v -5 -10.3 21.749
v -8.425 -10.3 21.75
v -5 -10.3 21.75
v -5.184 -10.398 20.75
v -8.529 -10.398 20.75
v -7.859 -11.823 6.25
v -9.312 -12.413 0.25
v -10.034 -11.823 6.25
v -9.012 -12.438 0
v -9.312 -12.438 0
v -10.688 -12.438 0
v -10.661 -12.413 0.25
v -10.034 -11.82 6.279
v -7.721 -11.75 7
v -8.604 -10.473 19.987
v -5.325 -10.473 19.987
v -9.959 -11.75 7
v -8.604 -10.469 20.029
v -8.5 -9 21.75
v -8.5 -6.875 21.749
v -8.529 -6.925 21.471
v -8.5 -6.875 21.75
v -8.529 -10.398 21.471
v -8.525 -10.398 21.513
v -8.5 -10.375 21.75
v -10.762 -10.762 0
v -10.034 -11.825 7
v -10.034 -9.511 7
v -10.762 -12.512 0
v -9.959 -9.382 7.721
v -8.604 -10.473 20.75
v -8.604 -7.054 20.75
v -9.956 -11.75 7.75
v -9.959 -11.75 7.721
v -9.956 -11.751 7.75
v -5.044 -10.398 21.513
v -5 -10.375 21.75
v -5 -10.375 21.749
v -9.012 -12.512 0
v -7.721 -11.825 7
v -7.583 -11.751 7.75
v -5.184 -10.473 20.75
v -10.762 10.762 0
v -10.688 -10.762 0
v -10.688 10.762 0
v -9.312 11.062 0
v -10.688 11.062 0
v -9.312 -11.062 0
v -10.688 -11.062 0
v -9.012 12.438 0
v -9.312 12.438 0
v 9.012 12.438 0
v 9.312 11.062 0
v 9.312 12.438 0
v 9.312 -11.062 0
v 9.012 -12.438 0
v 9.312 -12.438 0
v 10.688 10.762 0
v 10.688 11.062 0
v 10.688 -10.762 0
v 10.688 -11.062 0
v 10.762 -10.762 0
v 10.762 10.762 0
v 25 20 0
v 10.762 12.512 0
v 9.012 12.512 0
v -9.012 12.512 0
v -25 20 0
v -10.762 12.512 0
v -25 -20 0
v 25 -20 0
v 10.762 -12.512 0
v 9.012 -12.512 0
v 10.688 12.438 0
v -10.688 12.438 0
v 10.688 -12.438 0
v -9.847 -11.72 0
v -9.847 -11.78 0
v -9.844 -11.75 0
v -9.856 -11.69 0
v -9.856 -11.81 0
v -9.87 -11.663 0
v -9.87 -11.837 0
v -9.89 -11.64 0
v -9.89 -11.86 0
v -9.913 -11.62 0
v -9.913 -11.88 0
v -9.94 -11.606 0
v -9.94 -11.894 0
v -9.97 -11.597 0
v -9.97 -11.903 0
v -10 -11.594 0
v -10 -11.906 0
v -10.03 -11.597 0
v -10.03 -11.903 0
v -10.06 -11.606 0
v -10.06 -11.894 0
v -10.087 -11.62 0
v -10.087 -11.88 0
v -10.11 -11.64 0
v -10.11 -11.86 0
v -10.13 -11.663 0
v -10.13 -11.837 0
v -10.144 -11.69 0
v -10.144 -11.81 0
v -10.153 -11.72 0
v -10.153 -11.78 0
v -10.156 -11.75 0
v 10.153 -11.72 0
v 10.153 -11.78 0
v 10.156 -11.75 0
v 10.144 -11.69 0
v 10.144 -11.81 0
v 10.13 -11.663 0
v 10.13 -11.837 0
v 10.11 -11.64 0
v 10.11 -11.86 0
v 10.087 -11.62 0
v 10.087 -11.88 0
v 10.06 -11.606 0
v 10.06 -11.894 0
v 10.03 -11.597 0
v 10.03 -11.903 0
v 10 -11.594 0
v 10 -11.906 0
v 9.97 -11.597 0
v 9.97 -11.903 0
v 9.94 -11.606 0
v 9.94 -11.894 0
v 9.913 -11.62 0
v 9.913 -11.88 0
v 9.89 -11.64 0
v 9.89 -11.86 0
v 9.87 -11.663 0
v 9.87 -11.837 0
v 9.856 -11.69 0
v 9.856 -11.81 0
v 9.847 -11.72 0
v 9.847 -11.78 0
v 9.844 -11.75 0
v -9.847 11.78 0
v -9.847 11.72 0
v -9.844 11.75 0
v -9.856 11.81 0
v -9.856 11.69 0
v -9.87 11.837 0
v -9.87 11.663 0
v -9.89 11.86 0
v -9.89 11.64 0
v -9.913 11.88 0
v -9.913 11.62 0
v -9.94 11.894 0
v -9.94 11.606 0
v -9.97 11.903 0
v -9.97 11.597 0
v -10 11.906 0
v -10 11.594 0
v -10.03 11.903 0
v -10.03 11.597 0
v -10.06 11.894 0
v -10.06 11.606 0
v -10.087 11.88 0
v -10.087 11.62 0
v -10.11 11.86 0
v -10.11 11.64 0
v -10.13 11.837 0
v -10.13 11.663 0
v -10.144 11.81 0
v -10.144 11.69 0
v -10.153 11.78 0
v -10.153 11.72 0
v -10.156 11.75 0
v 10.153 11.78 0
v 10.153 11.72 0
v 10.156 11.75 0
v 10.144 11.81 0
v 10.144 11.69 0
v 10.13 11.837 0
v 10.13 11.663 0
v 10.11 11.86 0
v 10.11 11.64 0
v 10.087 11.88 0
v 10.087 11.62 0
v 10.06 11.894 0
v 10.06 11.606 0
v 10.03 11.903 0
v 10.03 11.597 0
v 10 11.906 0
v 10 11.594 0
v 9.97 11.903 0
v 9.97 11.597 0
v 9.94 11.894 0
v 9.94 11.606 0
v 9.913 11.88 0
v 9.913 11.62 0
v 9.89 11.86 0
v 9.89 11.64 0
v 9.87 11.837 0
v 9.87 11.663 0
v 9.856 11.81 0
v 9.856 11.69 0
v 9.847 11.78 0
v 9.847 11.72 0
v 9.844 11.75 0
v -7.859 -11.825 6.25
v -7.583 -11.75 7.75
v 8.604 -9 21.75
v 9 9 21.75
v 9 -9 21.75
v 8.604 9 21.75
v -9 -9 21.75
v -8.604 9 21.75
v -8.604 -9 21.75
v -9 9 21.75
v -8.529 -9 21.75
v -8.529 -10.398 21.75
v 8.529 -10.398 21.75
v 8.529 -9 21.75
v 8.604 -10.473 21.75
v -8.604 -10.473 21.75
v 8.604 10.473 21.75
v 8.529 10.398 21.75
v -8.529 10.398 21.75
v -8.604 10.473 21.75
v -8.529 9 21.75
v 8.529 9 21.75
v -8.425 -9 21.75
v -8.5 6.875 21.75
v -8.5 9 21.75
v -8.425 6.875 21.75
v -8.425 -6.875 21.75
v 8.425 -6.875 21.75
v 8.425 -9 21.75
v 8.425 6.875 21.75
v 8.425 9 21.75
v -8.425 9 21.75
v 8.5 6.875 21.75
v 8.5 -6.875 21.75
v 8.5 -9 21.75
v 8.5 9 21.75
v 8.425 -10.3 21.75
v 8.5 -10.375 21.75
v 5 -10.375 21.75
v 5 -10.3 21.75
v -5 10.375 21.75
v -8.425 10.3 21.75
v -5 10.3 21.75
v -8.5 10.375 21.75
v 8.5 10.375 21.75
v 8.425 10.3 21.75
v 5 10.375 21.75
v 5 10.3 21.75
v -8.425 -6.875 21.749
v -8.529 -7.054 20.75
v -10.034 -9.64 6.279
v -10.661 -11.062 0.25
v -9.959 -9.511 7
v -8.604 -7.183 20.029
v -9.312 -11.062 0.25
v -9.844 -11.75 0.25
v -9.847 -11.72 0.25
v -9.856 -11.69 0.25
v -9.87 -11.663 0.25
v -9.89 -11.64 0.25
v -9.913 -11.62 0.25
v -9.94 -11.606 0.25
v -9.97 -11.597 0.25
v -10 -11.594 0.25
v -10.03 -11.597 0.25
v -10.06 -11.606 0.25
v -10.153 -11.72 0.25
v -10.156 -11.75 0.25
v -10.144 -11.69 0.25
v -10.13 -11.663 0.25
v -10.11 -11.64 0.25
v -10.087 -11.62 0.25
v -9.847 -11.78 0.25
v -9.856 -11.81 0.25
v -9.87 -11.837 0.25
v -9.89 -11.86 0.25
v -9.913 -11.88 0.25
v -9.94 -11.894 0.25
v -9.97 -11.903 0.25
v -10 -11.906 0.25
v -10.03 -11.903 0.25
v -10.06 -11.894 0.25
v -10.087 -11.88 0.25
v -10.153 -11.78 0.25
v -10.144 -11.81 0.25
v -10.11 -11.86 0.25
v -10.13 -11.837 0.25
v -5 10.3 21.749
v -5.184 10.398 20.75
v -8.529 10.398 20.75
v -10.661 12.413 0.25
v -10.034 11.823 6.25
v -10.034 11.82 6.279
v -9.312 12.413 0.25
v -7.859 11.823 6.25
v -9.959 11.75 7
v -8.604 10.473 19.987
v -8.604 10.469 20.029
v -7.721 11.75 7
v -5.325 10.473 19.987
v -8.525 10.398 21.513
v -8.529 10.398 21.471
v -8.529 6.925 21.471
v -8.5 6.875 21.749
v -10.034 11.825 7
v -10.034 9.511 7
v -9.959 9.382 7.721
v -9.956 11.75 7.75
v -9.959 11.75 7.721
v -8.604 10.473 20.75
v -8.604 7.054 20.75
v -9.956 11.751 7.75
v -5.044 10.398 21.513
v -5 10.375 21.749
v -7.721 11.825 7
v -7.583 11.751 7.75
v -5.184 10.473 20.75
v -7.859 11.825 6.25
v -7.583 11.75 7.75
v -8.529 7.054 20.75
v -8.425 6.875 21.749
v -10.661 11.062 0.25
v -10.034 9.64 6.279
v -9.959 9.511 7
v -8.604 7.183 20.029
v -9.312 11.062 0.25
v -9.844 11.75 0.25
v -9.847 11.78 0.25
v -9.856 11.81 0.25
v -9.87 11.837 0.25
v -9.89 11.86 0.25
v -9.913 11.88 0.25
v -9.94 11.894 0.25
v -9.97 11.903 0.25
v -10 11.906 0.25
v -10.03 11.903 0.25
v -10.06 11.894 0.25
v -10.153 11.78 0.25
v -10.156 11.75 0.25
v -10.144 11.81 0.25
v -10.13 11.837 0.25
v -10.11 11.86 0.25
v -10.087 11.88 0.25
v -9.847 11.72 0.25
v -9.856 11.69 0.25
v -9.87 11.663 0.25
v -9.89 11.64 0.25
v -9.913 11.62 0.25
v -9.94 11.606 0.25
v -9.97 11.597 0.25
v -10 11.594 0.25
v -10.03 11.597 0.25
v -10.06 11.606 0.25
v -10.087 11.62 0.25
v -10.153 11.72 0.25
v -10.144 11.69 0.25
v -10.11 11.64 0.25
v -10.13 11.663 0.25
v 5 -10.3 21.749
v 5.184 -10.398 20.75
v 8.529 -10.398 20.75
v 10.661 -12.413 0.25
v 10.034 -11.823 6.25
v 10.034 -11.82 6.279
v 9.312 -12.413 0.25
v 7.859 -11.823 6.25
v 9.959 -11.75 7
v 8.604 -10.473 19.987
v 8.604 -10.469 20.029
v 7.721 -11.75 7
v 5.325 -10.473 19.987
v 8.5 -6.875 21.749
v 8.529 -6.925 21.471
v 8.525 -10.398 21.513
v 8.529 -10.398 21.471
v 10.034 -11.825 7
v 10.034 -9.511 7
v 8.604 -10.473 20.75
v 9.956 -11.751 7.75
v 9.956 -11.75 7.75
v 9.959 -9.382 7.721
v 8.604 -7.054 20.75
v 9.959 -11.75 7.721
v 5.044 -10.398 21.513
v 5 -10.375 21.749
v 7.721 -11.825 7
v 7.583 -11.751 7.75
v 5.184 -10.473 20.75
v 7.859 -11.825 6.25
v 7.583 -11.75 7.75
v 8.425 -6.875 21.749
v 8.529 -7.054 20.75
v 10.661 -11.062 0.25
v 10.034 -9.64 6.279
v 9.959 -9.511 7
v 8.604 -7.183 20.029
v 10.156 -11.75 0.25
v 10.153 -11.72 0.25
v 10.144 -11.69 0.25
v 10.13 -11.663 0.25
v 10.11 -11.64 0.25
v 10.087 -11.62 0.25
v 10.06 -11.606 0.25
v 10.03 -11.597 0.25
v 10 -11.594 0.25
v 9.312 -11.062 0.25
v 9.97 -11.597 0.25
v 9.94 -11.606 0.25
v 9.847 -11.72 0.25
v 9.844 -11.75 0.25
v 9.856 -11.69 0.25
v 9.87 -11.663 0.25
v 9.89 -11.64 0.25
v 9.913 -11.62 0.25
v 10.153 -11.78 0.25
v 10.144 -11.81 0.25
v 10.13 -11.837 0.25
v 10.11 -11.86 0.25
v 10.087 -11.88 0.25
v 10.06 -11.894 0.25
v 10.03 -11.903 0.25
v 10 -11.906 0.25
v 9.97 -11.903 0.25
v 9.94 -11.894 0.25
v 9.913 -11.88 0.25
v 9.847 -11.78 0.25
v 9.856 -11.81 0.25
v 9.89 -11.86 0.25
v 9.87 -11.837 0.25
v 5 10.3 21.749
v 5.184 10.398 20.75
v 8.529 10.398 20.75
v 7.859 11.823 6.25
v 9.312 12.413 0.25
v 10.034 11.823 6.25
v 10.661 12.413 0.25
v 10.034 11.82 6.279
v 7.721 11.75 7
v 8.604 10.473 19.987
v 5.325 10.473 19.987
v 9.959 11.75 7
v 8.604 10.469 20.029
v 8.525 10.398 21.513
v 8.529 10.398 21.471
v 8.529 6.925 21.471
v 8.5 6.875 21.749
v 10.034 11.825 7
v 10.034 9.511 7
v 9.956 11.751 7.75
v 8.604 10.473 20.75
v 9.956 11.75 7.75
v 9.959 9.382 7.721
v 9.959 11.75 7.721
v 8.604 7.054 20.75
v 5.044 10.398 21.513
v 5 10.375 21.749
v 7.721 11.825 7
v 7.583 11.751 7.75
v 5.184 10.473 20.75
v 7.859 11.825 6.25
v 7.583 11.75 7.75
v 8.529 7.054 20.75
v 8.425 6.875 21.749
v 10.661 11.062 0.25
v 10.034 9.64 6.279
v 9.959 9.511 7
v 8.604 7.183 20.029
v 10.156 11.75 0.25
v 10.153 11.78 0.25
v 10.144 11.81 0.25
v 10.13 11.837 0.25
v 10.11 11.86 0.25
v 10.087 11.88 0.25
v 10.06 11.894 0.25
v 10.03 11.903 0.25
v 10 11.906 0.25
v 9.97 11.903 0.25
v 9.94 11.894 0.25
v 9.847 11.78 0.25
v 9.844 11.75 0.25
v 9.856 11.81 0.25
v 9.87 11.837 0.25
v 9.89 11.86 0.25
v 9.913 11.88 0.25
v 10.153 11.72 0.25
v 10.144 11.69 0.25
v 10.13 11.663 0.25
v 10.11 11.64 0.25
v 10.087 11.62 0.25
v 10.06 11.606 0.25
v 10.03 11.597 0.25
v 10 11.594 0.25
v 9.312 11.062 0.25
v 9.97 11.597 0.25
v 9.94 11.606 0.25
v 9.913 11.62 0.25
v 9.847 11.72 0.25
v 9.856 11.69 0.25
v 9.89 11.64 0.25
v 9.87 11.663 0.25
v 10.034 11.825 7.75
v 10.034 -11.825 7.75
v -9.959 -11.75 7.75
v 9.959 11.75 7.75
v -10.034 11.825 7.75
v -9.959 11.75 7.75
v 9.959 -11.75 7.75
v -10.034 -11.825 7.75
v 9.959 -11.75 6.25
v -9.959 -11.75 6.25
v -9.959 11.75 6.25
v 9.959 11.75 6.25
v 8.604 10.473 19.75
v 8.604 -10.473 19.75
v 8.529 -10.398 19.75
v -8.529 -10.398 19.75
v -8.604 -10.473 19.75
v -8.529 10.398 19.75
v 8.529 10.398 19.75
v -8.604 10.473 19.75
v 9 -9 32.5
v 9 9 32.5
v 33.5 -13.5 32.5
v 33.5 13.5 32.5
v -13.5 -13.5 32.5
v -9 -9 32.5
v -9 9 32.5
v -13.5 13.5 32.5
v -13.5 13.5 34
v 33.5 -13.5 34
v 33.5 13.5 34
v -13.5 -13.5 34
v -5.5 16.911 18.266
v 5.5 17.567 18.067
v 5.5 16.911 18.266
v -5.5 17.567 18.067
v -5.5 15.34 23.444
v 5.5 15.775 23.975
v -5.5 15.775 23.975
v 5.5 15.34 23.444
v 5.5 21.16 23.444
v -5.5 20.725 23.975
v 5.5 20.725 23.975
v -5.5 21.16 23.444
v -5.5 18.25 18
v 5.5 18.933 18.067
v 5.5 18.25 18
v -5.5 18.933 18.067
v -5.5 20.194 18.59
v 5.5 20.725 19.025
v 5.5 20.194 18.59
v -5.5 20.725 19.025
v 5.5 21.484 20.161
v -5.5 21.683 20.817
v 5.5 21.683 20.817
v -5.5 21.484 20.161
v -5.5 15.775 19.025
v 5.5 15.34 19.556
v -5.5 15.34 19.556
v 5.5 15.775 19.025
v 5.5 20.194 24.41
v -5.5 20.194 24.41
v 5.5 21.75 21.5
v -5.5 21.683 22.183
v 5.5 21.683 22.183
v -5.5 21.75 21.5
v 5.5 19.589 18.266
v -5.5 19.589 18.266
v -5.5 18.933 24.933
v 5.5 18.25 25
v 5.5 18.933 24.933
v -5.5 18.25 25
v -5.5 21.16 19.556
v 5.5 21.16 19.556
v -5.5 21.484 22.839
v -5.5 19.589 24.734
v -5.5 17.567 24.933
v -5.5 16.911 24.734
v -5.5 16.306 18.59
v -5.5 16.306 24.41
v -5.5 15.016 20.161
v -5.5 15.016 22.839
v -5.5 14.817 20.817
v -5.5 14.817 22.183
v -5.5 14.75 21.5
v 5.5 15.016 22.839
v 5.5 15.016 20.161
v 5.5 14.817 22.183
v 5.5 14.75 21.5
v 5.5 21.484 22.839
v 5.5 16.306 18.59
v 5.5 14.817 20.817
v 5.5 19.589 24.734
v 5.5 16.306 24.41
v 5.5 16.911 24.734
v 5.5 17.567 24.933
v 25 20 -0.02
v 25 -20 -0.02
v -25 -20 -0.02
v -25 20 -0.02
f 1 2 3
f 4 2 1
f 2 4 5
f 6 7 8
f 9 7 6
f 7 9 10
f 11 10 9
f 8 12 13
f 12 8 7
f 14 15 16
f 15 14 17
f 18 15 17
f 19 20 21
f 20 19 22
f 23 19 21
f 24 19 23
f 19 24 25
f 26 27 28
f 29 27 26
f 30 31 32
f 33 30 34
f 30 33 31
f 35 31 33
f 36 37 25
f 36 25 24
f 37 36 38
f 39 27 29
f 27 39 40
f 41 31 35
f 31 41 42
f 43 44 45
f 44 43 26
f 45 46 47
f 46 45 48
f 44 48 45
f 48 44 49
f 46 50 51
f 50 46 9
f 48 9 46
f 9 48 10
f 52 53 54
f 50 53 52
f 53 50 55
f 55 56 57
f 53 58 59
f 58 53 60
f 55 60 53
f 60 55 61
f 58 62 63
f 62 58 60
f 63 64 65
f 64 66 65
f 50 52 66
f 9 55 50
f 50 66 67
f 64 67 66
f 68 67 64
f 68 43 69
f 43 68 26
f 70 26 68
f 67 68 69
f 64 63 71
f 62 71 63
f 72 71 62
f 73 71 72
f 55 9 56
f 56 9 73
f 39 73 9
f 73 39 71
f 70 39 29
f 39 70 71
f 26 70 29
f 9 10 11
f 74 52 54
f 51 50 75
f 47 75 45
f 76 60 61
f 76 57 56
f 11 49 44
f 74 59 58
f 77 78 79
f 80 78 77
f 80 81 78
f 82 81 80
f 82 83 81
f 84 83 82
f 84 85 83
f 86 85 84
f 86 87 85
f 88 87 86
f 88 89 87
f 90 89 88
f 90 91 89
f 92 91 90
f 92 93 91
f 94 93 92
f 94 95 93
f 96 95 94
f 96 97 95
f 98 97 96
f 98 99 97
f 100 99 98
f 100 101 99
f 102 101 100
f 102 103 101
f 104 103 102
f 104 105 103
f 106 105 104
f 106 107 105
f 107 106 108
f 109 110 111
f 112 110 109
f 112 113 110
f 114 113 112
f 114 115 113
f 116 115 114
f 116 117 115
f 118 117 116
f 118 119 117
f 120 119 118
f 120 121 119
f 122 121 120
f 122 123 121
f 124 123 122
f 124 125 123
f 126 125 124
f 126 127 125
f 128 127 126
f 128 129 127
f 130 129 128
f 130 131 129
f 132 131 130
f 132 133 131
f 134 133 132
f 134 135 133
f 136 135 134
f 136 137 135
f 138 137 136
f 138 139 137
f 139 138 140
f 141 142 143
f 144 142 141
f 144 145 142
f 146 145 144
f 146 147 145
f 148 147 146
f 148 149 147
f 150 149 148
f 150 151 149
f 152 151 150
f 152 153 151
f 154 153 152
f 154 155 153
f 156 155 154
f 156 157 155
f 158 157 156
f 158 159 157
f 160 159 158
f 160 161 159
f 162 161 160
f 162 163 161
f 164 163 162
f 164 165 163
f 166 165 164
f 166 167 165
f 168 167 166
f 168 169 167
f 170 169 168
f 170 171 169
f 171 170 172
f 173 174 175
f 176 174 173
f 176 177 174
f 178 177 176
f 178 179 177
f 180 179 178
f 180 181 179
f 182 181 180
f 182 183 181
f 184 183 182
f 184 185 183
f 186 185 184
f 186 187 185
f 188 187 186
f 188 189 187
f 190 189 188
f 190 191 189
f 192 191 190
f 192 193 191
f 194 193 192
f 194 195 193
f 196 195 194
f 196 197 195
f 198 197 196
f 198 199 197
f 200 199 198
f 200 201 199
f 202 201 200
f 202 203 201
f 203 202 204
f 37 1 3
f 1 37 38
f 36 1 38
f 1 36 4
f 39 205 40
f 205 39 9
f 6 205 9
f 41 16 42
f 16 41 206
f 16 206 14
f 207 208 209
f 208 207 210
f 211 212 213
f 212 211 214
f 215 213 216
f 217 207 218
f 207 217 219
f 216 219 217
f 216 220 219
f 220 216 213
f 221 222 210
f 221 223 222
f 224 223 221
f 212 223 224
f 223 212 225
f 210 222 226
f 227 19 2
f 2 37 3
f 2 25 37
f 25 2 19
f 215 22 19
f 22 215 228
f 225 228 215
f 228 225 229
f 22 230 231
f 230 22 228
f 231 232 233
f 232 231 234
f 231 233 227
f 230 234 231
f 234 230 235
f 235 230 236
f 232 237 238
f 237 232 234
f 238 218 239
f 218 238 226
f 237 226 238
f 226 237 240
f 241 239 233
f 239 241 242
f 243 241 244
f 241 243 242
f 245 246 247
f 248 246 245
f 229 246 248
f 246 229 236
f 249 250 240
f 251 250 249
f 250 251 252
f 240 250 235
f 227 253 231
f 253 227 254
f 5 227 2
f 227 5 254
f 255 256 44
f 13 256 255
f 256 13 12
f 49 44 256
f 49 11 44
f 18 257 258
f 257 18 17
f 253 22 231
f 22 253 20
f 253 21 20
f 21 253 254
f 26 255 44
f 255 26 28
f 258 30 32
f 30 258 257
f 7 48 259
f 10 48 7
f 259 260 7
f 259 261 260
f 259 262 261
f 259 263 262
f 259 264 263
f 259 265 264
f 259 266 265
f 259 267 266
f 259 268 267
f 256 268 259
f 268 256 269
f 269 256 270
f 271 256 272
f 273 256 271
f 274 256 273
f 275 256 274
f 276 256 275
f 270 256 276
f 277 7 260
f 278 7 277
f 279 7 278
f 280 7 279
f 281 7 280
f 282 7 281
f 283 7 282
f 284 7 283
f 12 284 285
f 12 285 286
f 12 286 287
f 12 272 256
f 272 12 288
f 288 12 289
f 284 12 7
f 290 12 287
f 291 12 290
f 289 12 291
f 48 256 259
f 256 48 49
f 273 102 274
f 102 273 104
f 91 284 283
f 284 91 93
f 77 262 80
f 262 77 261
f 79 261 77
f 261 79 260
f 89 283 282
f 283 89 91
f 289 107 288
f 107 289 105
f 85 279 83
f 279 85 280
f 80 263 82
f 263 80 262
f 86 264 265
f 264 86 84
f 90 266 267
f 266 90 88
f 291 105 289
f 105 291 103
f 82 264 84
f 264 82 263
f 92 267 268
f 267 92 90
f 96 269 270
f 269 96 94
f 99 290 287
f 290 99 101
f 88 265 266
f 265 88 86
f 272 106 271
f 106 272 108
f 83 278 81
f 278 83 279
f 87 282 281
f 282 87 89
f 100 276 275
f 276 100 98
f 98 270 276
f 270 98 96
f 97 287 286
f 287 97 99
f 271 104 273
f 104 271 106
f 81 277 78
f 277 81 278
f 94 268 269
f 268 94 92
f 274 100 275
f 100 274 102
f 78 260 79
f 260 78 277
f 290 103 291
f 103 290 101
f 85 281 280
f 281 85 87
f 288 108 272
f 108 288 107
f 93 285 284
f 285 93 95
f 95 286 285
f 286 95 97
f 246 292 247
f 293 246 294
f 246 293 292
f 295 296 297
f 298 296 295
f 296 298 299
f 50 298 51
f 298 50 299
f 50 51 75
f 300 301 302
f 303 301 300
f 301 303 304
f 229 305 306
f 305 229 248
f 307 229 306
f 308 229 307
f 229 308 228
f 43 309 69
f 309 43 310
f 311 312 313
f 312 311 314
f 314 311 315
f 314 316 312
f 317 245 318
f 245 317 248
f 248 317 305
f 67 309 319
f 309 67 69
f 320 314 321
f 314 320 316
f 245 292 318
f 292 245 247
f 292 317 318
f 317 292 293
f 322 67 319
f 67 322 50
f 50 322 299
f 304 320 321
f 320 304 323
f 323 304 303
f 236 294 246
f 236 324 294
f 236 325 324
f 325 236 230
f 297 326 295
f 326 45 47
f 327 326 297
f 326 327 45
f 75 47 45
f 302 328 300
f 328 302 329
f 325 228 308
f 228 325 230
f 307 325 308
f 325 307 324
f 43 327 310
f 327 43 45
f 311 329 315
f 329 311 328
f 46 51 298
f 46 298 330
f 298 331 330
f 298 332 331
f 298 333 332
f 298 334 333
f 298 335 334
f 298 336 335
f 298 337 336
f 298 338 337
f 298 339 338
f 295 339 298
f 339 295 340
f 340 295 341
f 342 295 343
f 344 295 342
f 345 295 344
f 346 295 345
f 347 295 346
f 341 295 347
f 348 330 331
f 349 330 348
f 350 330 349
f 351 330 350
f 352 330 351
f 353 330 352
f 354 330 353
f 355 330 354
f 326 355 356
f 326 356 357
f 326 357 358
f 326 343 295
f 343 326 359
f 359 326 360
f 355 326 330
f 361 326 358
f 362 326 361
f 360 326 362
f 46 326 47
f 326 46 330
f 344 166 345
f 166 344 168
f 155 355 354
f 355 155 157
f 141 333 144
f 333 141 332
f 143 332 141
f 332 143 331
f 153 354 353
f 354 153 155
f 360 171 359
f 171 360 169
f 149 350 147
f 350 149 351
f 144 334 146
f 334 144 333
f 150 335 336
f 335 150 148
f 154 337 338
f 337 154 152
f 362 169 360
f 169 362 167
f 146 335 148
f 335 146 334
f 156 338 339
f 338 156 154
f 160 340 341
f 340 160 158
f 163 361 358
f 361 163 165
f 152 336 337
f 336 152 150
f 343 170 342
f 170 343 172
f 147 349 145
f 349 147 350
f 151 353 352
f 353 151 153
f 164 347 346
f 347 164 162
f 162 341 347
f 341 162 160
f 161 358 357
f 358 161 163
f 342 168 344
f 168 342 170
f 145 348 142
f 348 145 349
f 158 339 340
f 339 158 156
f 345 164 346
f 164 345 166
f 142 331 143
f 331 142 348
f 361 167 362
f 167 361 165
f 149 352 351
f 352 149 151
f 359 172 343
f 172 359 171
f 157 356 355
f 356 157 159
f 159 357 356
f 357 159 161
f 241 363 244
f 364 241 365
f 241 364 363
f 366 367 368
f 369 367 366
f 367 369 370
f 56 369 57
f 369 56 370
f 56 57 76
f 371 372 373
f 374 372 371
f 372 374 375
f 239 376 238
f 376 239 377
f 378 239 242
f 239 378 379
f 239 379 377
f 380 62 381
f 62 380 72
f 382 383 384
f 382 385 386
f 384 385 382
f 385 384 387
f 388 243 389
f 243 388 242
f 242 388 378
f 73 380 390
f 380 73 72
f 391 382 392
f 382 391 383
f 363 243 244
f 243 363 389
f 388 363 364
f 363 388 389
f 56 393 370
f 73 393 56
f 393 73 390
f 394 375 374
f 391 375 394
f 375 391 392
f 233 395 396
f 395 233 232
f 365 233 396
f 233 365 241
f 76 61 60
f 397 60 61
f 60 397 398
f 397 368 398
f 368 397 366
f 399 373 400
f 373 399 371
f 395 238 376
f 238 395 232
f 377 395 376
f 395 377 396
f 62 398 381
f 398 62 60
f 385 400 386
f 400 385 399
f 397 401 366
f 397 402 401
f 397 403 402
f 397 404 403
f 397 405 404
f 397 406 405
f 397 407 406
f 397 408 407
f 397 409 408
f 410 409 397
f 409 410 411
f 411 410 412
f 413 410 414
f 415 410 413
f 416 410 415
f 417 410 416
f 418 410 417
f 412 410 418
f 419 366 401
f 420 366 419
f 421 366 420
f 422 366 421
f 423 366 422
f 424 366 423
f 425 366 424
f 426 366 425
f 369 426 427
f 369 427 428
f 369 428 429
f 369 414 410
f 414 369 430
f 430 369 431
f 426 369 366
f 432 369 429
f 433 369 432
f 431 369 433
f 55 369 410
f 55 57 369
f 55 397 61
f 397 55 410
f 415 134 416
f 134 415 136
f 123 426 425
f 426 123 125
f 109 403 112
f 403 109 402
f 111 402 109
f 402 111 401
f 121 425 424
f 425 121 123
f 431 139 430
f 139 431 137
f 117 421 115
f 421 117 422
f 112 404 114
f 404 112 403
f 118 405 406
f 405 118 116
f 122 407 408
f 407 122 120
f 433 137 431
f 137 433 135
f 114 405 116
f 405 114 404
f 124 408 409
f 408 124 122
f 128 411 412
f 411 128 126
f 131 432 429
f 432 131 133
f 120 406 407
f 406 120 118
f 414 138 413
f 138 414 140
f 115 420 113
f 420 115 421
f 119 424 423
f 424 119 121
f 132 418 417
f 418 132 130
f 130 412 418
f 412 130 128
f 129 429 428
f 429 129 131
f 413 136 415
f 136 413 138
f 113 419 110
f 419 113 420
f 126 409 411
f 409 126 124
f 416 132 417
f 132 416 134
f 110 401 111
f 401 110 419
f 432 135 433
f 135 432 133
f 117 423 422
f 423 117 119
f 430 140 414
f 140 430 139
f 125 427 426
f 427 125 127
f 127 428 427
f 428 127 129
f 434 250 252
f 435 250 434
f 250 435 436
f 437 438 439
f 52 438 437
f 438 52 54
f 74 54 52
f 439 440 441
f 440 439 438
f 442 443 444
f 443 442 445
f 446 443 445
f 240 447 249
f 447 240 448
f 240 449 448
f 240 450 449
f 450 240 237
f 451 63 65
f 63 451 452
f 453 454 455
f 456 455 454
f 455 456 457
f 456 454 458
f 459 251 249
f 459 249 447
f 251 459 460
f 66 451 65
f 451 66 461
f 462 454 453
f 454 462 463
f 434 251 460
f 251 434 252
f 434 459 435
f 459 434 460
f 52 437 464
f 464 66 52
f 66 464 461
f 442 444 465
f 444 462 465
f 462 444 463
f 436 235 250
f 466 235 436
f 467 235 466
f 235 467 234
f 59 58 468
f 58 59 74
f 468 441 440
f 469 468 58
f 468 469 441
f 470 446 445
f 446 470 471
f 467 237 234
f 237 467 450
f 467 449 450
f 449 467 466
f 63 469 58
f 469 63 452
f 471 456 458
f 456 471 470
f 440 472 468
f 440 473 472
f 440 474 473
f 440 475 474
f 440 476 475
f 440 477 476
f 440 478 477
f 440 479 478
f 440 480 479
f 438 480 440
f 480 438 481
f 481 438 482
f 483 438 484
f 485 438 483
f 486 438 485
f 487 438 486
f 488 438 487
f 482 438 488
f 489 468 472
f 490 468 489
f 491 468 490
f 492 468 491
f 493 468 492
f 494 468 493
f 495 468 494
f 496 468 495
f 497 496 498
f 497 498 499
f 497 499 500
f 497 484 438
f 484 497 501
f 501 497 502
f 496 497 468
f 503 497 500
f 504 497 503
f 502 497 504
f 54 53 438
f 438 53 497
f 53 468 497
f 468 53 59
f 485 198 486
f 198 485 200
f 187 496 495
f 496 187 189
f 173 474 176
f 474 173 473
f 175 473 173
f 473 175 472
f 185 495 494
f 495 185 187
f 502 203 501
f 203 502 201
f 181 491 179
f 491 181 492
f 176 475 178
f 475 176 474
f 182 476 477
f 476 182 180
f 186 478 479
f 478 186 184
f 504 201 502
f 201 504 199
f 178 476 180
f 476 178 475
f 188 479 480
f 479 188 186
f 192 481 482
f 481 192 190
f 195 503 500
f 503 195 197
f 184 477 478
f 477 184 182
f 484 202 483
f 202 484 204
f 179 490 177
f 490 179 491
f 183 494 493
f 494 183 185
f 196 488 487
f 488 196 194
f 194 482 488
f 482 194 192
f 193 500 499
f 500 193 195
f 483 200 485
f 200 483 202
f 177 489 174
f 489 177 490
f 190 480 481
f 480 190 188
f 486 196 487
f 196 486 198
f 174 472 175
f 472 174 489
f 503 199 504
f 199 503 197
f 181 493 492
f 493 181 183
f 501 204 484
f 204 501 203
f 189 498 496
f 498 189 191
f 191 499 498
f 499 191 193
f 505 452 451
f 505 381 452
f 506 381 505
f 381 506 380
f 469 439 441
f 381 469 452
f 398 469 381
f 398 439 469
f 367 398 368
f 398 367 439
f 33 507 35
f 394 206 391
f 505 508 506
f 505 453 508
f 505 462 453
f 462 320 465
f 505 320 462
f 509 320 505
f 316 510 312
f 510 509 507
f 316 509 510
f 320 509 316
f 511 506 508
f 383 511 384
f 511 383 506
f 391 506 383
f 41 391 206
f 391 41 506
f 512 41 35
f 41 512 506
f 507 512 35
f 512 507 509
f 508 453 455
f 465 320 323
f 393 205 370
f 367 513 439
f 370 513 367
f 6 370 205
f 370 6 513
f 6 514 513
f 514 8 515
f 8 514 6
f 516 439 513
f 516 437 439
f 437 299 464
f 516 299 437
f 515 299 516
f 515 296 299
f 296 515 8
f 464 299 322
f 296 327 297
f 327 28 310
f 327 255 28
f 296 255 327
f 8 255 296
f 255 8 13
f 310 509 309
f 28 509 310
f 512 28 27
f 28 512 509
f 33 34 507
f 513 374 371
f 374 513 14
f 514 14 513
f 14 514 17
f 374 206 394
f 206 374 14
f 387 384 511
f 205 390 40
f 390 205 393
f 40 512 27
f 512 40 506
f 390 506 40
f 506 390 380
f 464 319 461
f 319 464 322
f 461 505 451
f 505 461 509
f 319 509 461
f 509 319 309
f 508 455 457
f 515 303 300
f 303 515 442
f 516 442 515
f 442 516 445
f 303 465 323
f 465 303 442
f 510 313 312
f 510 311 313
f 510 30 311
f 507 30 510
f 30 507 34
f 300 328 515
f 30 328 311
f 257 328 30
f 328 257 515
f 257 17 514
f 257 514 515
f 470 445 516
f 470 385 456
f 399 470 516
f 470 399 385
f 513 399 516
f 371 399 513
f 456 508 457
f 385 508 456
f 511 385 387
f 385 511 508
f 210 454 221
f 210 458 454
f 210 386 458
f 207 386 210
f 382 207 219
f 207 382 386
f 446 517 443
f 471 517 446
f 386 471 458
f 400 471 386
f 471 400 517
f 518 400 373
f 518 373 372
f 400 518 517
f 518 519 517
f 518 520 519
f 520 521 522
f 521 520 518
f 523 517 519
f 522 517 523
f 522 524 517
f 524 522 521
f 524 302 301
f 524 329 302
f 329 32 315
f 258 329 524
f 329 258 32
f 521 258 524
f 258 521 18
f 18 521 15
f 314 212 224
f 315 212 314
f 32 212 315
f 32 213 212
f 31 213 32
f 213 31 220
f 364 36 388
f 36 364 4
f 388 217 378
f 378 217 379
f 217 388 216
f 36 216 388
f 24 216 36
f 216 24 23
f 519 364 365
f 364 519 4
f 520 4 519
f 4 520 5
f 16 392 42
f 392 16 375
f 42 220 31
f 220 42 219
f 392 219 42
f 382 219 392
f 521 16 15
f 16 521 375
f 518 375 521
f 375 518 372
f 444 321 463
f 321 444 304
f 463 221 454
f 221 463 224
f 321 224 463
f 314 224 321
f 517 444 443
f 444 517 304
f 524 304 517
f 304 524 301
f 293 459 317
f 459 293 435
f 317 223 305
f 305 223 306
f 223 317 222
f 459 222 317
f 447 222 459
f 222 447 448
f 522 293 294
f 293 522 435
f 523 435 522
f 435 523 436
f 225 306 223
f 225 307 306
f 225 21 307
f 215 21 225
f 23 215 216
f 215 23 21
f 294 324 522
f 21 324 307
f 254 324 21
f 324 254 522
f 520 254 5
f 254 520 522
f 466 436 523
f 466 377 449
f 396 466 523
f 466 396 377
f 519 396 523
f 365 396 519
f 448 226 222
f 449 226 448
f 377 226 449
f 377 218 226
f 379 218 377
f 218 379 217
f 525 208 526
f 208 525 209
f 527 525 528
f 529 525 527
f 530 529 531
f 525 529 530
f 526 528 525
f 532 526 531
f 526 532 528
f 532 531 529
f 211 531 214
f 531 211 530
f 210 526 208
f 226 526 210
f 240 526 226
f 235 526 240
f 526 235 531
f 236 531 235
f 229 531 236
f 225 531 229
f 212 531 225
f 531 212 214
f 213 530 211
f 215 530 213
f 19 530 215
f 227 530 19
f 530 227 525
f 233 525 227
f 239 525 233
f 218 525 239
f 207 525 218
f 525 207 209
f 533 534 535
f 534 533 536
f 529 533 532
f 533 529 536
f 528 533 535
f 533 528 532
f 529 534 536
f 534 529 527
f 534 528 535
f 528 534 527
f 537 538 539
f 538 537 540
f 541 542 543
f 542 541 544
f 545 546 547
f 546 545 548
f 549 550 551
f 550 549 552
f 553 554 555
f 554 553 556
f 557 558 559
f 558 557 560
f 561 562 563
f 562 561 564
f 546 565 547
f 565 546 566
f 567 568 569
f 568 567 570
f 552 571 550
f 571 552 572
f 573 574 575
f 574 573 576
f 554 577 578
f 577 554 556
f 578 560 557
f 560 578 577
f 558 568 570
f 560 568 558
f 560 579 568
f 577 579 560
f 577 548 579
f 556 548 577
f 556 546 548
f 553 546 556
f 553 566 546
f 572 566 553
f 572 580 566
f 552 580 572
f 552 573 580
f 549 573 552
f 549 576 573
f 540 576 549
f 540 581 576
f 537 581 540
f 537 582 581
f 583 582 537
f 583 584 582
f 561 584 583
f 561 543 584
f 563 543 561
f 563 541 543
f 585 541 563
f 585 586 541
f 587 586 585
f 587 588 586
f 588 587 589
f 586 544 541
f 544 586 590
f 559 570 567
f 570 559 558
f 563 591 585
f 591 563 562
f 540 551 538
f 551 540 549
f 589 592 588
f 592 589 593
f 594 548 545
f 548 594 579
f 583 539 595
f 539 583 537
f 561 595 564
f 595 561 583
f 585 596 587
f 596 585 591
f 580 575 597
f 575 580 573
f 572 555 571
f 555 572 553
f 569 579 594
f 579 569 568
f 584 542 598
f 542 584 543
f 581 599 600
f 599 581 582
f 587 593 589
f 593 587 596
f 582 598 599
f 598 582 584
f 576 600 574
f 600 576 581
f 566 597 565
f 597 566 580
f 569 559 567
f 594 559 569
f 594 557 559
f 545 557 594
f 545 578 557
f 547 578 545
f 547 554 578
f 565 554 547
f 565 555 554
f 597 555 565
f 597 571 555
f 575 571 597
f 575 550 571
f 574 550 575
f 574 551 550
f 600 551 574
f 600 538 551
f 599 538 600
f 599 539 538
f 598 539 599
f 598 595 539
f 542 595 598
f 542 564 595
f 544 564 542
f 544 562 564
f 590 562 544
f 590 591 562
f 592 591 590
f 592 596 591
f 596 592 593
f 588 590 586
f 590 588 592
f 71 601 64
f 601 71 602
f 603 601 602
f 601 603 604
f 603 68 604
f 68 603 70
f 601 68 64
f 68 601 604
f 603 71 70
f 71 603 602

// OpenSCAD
// Powermatic 64 table saw - existing leg stand (reference model)
// All units are INCHES. Values marked GUESS need to be measured.
// Axes: X = left/right, Y = front/back (front is -Y), Z = up. Origin = floor, center of footprint.

/* [Leg footprint] */
// Front-to-back, center of foot to center of foot, at the floor (MEASURED)
floor_depth = 23.5;
// Side-to-side, center of foot to center of foot, at the floor (MEASURED)
floor_width = 20;
// Front-to-back, at the top of the legs, OUTSIDE corner to OUTSIDE corner (MEASURED)
top_depth = 20.75;
// Side-to-side, at the top of the legs, OUTSIDE corner to OUTSIDE corner (MEASURED)
top_width = 17;
// Straight up from the floor to the top of the legs, not along the slant (MEASURED)
leg_height = 21.75;

/* [Leg shape] */
// The legs taper. Width of each side of the L at the TOP of the leg (MEASURED)
leg_flange_top = 3.5;
// Width of each side of the L at the BOTTOM of the leg (MEASURED)
leg_flange_bottom = 1.75;
// Metal thickness (GUESS, about 14 gauge)
leg_thickness = 0.075;

/* [Feet] */
// true = flat pad at the bottom of each leg, false = bare leg end (GUESS)
has_foot_pad = true;
// Pad size, square. Must fit inside the L: no bigger than leg_flange_bottom - leg_thickness (GUESS)
foot_pad_size = 1.375;
// Pad thickness (GUESS)
foot_pad_thickness = 0.25;
// Bolt hole diameter in the pad, 0 = no hole (GUESS)
foot_hole_dia = 0.3125;

// The pad sits completely inside the L, tucked against the inside faces of the metal.
// Distance from the leg's outside corner to the center of the pad, along one side.
foot_inset = leg_thickness + foot_pad_size / 2;

/* [Cross braces] */
// Height of the lower braces off the floor, center of brace (GUESS)
brace_height = 7;
// Brace width, vertical (GUESS)
brace_width = 1.5;
// Which sides have a lower brace (GUESS)
brace_front = true;
brace_back = true;
brace_left = true;
brace_right = true;
// Top apron band around the top of the stand (GUESS)
has_top_apron = true;
apron_width = 2;

/* [Saw body (context)] */
show_saw = true;
// Floor to the top of the cast-iron table (GUESS, typical is 34)
table_height = 34;
// Main cast-iron top, side-to-side (GUESS)
table_width = 27;
// Main cast-iron top, front-to-back (GUESS)
table_depth = 27;
// Table thickness (GUESS)
table_thickness = 1.5;
// Lowest point of the saw body, floor to bottom. 0 = sits right on top of the legs
saw_body_bottom = 0;
// Saw body (trunnion housing) size under the table (GUESS)
saw_body_width = 18;
saw_body_depth = 18;

/* [Extension and router table (context)] */
// Width of extension wing + router table combined, added to one side (GUESS)
extension_width = 20;
// Which side the extension is on: 1 = right, -1 = left (GUESS)
extension_side = 1;

/* [Motor (context)] */
// How far the motor sticks out past the back legs, measured at the floor line (GUESS)
motor_overhang = 10;
// Floor to the bottom of the motor (GUESS)
motor_bottom = 18;
// Motor diameter (GUESS)
motor_dia = 7;
// Motor length, side-to-side (GUESS)
motor_length = 11;

$fn = 32;

// ---------- Geometry helpers ----------

// Saw body bottom: on top of the legs unless set by hand
body_bottom = saw_body_bottom > 0 ? saw_body_bottom : leg_height;

// Outside-corner spread at the floor (feet sit inside the L, so corners are farther out)
corner_width = floor_width + 2 * foot_inset;
corner_depth = floor_depth + 2 * foot_inset;

// Outside-corner spread at height z (legs flare linearly from top to floor)
function width_at(z) = corner_width + (top_width - corner_width) * z / leg_height;
function depth_at(z) = corner_depth + (top_depth - corner_depth) * z / leg_height;

// Tapered L-shaped angle, corner at the origin, flanges along +X and +Y.
// Each side tapers from leg_flange_bottom at the floor to leg_flange_top at the top.
module tapered_angle(h) {
    t = leg_thickness;
    e = 0.001;
    hull() {
        cube([leg_flange_bottom, t, e]);
        translate([0, 0, h - e]) cube([leg_flange_top, t, e]);
    }
    hull() {
        cube([t, leg_flange_bottom, e]);
        translate([0, 0, h - e]) cube([t, leg_flange_top, e]);
    }
}

// One leg at corner (sx, sy), each +1 or -1. The L corner sits on the outside,
// and the foot pad sits inside the L.
module leg(sx, sy) {
    foot = [sx * floor_width / 2, sy * floor_depth / 2, 0];
    corner = [sx * corner_width / 2, sy * corner_depth / 2, 0];
    dx = sx * (top_width - corner_width) / 2;
    dy = sy * (top_depth - corner_depth) / 2;
    translate(corner)
        multmatrix([[1, 0, dx / leg_height, 0],
                    [0, 1, dy / leg_height, 0],
                    [0, 0, 1, 0]])
            scale([-sx, -sy, 1])
                tapered_angle(leg_height);
    if (has_foot_pad)
        translate(foot) foot_pad();
}

module foot_pad() {
    difference() {
        translate([-foot_pad_size / 2, -foot_pad_size / 2, 0])
            cube([foot_pad_size, foot_pad_size, foot_pad_thickness]);
        if (foot_hole_dia > 0)
            translate([0, 0, -0.1]) cylinder(d = foot_hole_dia, h = foot_pad_thickness + 0.2);
    }
}

// Flat band around the stand, centered at height z
module band(z, w, front, back, left, right) {
    W = width_at(z);
    D = depth_at(z);
    t = leg_thickness;
    if (front) translate([-W / 2, -D / 2, z - w / 2]) cube([W, t, w]);
    if (back)  translate([-W / 2, D / 2 - t, z - w / 2]) cube([W, t, w]);
    if (left)  translate([-W / 2, -D / 2, z - w / 2]) cube([t, D, w]);
    if (right) translate([W / 2 - t, -D / 2, z - w / 2]) cube([t, D, w]);
}

module stand() {
    color("DimGray") {
        for (sx = [-1, 1], sy = [-1, 1]) leg(sx, sy);
        band(brace_height, brace_width, brace_front, brace_back, brace_left, brace_right);
        if (has_top_apron)
            band(leg_height - apron_width / 2, apron_width, true, true, true, true);
    }
}

module saw() {
    // Saw body (trunnion housing) between stand and table
    color("SlateGray", 0.6)
        translate([-saw_body_width / 2, -saw_body_depth / 2, body_bottom])
            cube([saw_body_width, saw_body_depth, table_height - table_thickness - body_bottom]);
    // Main cast-iron table
    color("Silver", 0.7)
        translate([-table_width / 2, -table_depth / 2, table_height - table_thickness])
            cube([table_width, table_depth, table_thickness]);
    // Extension wing + router table
    color("BurlyWood", 0.7)
        translate([extension_side > 0 ? table_width / 2 : -table_width / 2 - extension_width,
                   -table_depth / 2, table_height - table_thickness])
            cube([extension_width, table_depth, table_thickness]);
    // Motor hanging off the back
    color("SteelBlue", 0.7)
        translate([0, floor_depth / 2 + motor_overhang - motor_dia / 2, motor_bottom + motor_dia / 2])
            rotate([0, 90, 0]) cylinder(d = motor_dia, h = motor_length, center = true);
}

// ---------- Assembly ----------

stand();
if (show_saw) saw();

// Floor reference
color("LightGray", 0.3) translate([-25, -20, -0.02]) cube([50, 40, 0.02]);
